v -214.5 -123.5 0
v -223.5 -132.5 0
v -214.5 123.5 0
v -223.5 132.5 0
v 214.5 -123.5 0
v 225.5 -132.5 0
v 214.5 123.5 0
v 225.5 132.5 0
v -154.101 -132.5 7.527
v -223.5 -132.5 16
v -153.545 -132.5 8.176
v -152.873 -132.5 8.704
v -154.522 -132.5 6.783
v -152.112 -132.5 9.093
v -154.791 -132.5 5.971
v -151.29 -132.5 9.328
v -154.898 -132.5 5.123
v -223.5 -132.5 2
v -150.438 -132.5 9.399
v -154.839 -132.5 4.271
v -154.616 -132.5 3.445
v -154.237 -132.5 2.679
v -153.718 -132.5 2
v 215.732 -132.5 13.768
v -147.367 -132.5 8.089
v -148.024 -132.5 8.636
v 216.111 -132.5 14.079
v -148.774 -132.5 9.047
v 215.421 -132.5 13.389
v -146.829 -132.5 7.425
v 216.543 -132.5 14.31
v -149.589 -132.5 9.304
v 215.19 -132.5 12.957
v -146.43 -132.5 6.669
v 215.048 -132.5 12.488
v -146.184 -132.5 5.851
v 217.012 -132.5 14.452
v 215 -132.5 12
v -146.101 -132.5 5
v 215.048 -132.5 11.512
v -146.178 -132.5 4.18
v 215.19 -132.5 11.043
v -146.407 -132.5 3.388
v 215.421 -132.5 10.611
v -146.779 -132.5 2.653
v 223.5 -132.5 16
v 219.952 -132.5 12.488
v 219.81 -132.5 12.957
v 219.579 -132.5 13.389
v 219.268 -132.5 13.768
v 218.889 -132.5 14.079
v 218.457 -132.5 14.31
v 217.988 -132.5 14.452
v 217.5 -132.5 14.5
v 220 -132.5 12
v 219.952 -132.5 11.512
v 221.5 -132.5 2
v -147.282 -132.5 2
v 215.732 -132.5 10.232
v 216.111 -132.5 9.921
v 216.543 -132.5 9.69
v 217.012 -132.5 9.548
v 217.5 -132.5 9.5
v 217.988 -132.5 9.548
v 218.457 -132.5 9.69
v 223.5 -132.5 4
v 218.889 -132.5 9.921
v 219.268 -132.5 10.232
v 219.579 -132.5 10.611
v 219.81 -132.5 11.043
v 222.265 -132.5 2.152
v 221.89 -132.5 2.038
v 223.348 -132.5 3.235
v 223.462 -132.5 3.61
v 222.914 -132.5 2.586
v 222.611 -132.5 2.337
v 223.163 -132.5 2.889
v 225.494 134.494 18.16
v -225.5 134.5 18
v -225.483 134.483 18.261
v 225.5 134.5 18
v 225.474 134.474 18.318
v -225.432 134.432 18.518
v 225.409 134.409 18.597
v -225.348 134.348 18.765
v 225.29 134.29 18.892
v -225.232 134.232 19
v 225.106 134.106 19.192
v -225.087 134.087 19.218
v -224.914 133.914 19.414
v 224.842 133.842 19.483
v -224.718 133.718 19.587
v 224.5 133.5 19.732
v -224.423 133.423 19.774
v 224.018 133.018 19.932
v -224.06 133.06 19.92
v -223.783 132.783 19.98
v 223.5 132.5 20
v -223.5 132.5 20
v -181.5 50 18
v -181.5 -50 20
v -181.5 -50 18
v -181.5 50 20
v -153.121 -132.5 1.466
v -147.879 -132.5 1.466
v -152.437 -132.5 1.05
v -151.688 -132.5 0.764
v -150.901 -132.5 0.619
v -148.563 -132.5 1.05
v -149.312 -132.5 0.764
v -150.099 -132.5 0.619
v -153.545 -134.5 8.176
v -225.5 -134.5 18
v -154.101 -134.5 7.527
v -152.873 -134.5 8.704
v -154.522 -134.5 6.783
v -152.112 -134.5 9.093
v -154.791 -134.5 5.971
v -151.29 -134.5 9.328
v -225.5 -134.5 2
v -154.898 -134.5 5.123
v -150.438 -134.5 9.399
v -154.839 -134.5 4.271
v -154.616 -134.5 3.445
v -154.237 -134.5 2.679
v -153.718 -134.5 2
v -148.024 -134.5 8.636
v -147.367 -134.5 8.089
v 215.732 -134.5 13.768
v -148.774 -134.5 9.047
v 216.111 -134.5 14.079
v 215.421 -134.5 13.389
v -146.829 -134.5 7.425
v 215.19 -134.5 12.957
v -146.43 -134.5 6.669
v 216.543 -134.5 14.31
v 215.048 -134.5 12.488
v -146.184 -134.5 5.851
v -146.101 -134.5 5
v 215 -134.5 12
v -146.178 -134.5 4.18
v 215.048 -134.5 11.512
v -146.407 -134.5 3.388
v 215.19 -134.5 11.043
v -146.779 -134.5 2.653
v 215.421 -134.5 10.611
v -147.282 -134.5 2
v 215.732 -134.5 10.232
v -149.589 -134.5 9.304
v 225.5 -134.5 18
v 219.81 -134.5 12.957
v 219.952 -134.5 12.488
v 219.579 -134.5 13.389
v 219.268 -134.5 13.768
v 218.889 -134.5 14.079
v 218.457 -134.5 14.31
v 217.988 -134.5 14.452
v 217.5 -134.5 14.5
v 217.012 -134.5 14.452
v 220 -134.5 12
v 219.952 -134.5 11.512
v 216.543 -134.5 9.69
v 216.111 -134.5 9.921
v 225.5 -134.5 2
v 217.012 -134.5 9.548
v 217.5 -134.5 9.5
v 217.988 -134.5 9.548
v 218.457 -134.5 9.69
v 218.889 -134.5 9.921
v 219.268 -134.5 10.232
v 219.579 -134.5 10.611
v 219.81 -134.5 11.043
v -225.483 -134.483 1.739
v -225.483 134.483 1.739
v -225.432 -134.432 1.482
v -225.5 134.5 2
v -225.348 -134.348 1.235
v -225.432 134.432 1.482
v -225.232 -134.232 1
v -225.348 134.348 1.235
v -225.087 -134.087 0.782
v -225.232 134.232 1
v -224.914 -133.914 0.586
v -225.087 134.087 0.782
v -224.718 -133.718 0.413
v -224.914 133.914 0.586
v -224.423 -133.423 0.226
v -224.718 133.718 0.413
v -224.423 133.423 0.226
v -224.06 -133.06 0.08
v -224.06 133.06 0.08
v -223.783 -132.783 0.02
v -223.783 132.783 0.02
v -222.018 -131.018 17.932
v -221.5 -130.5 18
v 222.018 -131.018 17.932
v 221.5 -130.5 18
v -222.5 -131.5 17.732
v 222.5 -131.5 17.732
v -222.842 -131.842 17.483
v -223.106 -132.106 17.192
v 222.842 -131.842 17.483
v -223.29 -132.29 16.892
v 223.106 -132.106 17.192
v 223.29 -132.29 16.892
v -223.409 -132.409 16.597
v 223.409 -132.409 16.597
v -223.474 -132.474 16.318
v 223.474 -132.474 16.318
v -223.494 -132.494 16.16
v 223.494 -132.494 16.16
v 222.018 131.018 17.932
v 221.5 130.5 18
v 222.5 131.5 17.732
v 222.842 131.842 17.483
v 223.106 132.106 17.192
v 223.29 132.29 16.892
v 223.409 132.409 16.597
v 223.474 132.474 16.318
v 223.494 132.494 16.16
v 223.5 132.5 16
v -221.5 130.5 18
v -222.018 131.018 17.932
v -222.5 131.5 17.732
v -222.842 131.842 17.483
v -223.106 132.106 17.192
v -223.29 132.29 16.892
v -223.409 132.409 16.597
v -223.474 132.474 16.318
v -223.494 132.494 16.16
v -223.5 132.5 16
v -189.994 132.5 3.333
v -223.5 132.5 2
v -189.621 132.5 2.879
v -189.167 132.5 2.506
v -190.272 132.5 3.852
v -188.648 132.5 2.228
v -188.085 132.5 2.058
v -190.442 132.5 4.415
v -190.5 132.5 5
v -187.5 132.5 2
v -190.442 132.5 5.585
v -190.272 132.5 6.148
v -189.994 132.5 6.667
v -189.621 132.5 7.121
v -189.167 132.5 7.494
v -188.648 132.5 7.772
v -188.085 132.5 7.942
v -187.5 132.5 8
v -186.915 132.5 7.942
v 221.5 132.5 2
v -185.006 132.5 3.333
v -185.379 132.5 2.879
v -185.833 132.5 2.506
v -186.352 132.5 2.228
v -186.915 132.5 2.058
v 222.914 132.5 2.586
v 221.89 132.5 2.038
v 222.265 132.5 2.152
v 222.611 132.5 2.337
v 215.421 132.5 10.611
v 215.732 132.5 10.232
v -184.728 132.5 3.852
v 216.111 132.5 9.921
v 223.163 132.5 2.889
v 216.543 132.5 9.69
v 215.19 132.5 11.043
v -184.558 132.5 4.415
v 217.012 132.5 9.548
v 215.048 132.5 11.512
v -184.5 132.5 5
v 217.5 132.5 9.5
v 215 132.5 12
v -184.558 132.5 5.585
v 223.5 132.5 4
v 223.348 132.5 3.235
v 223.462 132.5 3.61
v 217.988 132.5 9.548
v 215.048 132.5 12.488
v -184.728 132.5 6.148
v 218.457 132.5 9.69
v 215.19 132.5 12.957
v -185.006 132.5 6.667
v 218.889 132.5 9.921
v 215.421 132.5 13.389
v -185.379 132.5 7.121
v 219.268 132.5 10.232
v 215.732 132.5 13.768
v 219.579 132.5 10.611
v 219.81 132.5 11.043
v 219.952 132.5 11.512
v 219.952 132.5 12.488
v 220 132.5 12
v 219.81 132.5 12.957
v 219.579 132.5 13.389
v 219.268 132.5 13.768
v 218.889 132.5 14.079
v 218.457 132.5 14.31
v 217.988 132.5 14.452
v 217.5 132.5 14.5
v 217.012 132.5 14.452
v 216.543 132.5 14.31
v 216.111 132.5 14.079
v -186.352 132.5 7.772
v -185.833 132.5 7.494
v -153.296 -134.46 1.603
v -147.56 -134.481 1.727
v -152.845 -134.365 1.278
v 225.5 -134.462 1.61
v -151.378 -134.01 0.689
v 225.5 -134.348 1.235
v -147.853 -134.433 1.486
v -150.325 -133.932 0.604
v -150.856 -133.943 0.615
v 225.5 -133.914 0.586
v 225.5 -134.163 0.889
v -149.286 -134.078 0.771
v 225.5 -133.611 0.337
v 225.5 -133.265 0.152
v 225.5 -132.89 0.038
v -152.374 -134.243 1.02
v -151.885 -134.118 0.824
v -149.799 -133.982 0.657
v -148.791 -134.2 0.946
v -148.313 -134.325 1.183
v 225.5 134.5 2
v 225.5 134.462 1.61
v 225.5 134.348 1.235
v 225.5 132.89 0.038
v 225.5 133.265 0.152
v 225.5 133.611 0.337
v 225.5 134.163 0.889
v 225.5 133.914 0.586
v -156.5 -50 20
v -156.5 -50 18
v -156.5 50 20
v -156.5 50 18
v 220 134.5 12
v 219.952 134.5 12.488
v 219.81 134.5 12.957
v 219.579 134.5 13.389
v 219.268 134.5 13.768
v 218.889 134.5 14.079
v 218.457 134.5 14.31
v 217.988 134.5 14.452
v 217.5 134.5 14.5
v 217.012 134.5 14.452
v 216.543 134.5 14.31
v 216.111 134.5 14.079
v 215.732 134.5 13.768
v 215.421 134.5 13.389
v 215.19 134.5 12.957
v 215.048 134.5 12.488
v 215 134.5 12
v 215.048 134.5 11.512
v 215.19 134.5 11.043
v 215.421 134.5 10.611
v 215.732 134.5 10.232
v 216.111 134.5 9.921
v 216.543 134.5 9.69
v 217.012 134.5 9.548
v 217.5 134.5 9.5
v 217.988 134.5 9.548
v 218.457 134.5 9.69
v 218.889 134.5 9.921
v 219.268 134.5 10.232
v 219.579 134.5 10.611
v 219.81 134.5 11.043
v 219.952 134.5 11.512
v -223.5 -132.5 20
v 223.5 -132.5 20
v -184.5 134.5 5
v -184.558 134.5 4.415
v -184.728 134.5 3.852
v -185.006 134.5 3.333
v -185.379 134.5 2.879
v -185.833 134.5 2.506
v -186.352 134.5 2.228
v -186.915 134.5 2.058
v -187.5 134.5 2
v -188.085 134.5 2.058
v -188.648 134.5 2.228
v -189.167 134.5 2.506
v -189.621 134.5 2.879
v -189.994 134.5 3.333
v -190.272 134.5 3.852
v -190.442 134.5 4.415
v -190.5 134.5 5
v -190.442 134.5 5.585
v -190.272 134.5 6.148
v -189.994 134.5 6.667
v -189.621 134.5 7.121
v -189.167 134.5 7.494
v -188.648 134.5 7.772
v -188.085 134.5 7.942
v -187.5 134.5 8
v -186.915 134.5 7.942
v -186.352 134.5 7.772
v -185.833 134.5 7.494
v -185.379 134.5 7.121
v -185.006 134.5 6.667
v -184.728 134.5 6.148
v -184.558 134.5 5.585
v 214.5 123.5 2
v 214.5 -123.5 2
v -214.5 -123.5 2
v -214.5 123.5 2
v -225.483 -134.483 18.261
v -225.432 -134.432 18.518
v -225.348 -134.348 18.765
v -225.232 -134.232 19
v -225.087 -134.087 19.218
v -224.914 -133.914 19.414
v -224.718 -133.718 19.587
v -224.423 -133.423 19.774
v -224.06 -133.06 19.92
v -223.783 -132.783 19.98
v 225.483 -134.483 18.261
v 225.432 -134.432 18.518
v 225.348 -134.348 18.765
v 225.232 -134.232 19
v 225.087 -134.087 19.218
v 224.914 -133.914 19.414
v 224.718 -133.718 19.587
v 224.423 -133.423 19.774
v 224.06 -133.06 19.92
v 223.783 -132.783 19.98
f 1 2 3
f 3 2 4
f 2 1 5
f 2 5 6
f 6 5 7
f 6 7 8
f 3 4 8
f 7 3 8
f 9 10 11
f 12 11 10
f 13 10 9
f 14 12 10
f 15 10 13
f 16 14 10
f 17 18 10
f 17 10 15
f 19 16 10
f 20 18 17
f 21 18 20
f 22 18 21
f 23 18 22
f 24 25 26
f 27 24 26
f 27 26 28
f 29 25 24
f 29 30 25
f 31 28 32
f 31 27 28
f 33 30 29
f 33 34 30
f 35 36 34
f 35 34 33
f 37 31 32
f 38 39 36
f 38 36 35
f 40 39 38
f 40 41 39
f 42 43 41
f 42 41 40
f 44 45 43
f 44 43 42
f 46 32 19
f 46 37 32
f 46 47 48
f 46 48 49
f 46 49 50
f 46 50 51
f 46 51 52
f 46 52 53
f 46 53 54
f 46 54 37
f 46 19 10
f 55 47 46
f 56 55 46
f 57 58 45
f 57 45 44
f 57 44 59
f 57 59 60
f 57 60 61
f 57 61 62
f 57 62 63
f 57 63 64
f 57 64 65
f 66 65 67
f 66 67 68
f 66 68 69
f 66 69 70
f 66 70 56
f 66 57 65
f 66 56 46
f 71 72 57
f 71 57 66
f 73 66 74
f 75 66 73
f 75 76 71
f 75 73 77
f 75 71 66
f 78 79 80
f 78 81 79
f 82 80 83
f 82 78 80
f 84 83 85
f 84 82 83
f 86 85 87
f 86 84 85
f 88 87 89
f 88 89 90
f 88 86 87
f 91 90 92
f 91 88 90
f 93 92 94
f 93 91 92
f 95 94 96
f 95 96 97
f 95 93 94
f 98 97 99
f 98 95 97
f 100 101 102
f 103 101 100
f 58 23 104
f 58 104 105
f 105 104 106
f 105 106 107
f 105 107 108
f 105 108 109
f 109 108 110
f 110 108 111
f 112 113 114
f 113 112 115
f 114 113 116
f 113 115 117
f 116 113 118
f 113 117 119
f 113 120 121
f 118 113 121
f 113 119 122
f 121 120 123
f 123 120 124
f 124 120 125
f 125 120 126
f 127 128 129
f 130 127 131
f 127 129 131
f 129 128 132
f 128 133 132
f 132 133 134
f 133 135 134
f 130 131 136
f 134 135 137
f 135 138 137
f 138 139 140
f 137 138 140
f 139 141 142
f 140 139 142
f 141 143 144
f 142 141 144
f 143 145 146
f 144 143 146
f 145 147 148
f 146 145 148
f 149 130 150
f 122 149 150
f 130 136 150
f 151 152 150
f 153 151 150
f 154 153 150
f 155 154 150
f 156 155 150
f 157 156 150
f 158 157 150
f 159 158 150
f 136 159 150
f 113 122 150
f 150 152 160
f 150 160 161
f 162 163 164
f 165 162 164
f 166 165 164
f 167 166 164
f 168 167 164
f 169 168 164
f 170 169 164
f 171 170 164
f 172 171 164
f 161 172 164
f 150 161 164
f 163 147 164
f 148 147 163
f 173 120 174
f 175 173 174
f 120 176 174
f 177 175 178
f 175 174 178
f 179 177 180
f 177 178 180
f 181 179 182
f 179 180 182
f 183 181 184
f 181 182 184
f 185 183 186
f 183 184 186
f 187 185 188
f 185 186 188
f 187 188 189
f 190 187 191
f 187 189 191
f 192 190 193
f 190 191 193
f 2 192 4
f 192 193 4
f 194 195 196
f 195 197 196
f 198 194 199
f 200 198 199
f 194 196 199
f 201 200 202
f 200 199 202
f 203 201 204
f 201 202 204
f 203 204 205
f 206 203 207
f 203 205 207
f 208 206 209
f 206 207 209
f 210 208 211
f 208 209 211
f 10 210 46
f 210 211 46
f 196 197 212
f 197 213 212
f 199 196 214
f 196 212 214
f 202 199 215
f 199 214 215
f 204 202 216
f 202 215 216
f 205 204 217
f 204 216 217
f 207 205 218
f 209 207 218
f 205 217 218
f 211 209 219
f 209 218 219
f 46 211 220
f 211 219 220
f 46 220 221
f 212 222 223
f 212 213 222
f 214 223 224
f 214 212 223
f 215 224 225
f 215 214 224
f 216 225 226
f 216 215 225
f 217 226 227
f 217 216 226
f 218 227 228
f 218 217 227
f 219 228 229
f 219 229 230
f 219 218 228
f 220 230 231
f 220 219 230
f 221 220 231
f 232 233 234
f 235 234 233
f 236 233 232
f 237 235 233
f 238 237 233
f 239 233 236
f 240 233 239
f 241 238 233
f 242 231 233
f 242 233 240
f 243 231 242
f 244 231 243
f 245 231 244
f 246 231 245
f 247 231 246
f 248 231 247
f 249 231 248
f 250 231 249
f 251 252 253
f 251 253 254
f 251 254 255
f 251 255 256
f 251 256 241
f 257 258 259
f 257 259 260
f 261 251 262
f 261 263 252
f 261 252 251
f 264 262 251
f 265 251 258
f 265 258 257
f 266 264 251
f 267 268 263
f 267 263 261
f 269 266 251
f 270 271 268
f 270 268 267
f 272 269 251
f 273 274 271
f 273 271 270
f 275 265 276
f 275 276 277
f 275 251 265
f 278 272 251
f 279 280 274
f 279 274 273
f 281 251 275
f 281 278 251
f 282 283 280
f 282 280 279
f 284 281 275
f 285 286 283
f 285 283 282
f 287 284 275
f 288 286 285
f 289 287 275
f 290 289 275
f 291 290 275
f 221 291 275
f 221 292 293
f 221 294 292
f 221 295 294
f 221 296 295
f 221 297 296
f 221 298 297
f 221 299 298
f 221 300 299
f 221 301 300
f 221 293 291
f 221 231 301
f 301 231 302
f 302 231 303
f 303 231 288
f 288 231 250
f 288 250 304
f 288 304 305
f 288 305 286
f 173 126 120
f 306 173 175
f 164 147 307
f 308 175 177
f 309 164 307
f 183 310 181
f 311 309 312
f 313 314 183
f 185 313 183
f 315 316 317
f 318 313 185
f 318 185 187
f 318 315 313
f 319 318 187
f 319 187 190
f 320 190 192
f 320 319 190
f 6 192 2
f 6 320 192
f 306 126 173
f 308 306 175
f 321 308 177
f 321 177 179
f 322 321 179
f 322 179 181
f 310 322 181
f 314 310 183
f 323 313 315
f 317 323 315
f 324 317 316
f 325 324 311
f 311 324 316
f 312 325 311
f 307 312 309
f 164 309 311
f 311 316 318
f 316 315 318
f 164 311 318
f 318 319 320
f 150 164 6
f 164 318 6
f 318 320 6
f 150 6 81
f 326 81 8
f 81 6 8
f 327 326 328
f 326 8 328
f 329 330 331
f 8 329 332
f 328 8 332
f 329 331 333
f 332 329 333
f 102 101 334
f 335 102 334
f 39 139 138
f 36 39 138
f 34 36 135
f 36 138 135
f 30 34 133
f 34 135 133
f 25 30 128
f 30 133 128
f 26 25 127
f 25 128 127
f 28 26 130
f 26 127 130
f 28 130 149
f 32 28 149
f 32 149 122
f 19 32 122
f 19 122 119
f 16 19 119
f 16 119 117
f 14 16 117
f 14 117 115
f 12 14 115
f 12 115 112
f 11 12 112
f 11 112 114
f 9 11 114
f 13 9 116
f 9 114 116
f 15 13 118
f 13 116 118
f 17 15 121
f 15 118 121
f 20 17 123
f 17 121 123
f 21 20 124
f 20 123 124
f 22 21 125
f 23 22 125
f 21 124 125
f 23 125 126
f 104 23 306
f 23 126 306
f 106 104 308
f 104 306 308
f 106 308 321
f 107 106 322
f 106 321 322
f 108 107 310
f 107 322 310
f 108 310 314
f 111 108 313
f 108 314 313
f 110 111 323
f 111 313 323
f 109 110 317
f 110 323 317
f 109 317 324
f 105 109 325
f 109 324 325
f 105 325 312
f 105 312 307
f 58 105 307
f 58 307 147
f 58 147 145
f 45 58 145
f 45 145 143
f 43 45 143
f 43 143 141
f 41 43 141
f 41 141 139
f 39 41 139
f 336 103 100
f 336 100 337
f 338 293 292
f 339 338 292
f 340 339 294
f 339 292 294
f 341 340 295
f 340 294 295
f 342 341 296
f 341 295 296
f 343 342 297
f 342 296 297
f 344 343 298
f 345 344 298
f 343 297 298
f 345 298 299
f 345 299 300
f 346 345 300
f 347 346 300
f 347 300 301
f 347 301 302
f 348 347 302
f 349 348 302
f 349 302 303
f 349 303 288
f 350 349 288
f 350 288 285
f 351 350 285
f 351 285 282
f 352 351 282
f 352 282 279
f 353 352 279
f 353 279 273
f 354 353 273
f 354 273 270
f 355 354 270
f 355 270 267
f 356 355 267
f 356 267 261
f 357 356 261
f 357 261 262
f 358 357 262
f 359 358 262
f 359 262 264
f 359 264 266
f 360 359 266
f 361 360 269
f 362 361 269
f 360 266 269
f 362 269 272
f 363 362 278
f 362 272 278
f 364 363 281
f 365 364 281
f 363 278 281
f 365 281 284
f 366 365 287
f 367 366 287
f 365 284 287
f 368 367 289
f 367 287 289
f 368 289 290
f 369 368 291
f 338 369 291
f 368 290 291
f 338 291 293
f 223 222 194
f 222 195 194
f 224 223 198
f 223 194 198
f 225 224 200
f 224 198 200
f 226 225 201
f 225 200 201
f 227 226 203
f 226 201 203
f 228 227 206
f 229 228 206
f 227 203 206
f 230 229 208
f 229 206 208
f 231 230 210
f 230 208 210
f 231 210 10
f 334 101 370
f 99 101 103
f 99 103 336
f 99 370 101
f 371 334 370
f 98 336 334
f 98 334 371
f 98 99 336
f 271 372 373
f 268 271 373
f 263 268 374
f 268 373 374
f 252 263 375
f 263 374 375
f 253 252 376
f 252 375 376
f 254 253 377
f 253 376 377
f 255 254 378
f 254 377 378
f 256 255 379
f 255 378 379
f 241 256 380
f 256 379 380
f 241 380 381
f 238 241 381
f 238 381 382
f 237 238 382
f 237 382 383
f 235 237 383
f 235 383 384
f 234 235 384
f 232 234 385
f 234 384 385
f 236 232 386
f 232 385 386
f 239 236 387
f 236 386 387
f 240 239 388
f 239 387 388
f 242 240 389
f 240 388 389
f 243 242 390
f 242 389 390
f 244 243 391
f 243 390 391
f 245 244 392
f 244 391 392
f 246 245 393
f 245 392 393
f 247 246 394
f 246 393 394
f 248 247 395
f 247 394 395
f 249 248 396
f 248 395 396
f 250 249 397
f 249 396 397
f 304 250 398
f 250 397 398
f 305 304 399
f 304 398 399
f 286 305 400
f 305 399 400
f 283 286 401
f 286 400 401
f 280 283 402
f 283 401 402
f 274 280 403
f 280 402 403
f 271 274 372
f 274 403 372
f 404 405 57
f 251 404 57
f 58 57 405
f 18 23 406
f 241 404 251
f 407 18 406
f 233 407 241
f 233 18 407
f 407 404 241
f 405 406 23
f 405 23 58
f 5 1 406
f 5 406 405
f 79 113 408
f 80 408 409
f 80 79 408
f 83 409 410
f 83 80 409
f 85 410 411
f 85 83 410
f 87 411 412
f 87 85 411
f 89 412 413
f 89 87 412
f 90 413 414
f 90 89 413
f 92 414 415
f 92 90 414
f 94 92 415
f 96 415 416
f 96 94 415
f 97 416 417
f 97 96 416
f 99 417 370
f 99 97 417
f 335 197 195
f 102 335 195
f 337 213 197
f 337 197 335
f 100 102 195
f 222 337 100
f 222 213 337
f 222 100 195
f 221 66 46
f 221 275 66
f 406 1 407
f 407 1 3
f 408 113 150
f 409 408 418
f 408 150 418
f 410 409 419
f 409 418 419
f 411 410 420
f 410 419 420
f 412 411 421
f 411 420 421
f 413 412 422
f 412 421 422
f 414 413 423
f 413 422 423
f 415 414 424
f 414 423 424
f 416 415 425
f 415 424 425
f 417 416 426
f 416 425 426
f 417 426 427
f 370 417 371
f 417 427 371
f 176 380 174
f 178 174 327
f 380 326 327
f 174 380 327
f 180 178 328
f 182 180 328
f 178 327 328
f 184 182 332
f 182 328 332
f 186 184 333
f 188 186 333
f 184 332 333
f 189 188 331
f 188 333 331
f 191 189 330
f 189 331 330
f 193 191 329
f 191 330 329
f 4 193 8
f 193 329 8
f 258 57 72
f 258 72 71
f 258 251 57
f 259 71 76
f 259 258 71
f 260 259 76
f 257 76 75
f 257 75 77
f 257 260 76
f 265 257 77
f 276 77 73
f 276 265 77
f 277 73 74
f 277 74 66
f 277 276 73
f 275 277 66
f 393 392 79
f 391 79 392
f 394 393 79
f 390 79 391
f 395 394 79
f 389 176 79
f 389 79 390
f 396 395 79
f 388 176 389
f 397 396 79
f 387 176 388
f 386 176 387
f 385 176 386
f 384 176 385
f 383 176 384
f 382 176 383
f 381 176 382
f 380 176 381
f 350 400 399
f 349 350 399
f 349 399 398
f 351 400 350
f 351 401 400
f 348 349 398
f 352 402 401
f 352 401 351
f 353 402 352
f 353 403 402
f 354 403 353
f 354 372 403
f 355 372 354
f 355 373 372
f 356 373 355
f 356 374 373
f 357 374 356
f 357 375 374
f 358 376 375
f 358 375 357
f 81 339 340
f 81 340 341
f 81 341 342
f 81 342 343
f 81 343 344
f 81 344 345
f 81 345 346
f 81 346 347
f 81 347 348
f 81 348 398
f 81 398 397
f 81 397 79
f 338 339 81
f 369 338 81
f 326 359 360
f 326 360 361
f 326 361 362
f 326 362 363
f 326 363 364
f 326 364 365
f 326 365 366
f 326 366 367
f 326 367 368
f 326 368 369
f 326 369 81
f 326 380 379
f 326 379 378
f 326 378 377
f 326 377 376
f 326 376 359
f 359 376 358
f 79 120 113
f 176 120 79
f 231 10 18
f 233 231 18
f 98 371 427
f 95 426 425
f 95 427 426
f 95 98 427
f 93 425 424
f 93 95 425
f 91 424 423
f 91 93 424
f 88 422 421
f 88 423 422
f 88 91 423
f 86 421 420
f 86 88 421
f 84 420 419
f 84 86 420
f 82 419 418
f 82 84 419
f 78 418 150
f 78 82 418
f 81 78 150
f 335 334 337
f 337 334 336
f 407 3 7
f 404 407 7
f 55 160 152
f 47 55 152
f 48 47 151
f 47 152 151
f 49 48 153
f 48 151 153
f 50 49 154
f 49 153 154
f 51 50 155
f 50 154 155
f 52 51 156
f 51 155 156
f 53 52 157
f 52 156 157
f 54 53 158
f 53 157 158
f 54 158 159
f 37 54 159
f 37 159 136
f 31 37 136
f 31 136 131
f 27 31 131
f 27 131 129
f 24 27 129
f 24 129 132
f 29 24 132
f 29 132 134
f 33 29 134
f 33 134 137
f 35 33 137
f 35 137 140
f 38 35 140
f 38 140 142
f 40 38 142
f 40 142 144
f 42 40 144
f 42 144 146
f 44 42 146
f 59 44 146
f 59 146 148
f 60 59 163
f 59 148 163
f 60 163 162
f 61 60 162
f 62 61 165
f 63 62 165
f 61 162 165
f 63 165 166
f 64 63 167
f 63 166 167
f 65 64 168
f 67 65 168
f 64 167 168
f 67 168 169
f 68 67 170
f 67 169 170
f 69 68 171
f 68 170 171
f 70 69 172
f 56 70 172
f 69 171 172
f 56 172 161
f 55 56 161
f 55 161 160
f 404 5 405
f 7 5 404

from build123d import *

# Parameters (mm, degrees)
SKETCH1_W           = 451
SKETCH1_H           = 269
BOSS_EXTRUDE1_DEPTH = 20
SHELL1_T            = -11
SKETCH2_W           = 429
SKETCH2_H           = 247
CUT_EXTRUDE1_DEPTH  = 9
SKETCH4_W           = 16
SKETCH4_H           = 247
CUT_EXTRUDE3_DEPTH  = 9
SKETCH8_W           = 438
SKETCH8_H           = 16
CUT_EXTRUDE4_DEPTH  = 9
SKETCH9_W           = 16
SKETCH9_H           = 256
CUT_EXTRUDE5_DEPTH  = 9
SKETCH10_W          = 447
SKETCH10_H          = 16
CUT_EXTRUDE6_DEPTH  = 9
SKETCH11_W          = 25
SKETCH11_H          = 100
CUT_EXTRUDE7_DEPTH  = 2
FILLET1_R           = 2
FILLET2_R           = 2
SKETCH12_R          = 3
CUT_EXTRUDE8_DEPTH  = 2
SKETCH13_R          = 4.399472723
CUT_EXTRUDE9_DEPTH  = 2
SKETCH14_R          = 2.5
CUT_EXTRUDE10_DEPTH = 270


with BuildPart() as part:
    # Sketch1 → Boss-Extrude1 (new body)
    with BuildSketch(Plane.XY):
        Rectangle(SKETCH1_W, SKETCH1_H)
    extrude(amount=BOSS_EXTRUDE1_DEPTH)

    # Shell1
    shell1_openings = [part.faces().sort_by_distance(p)[0] for p in [
        (0, 0, 0),
    ]]
    offset(amount=SHELL1_T, openings=shell1_openings, kind=Kind.INTERSECTION)

    # Sketch2 → Cut-Extrude1 (cut)
    with BuildSketch(Plane(origin=(0, 0, 9), x_dir=(-1, 0, 0), z_dir=(0, 0, -1))):
        Rectangle(SKETCH2_W, SKETCH2_H)
    extrude(amount=-CUT_EXTRUDE1_DEPTH, mode=Mode.SUBTRACT)

    # Sketch4 → Cut-Extrude3 (cut)
    with BuildSketch(Plane.ZY.offset(-214.5)):
        with Locations((10, 0)):
            Rectangle(SKETCH4_W, SKETCH4_H)
    extrude(amount=-CUT_EXTRUDE3_DEPTH, mode=Mode.SUBTRACT)

    # Sketch8 → Cut-Extrude4 (cut)
    with BuildSketch(Plane.XZ.offset(-123.5)):
        with Locations((4.5, 10)):
            Rectangle(SKETCH8_W, SKETCH8_H)
    extrude(amount=-CUT_EXTRUDE4_DEPTH, mode=Mode.SUBTRACT)

    # Sketch9 → Cut-Extrude5 (cut)
    with BuildSketch(Plane(origin=(-214.5, 0, 0), x_dir=(0, 0, -1), z_dir=(1, 0, 0))):
        with Locations((-10, 4.5)):
            Rectangle(SKETCH9_W, SKETCH9_H)
    extrude(amount=-CUT_EXTRUDE5_DEPTH, mode=Mode.SUBTRACT)

    # Sketch10 → Cut-Extrude6 (cut)
    with BuildSketch(Plane(origin=(0, -123.5, 0), x_dir=(1, 0, 0), z_dir=(0, 1, 0))):
        with Locations((0, -10)):
            Rectangle(SKETCH10_W, SKETCH10_H)
    extrude(amount=-CUT_EXTRUDE6_DEPTH, mode=Mode.SUBTRACT)

    # Sketch11 → Cut-Extrude7 (cut)
    with BuildSketch(Plane.XY.offset(20)):
        with Locations((-169, 0)):
            Rectangle(SKETCH11_W, SKETCH11_H)
    extrude(amount=-CUT_EXTRUDE7_DEPTH, mode=Mode.SUBTRACT)

    # Fillet1
    fillet1_edges = [part.edges().sort_by_distance(p)[0] for p in [
        (-225.5, 0, 20),
        (0, -134.5, 20),
        (223.5, 0, 2),
        (225.5, 0, 20),
        (0, -134.5, 0),
        (-225.5, 0, 0),
        (0, 134.5, 0),
        (0, 134.5, 20),
    ]]
    fillet(fillet1_edges, radius=FILLET1_R)

    # Fillet2
    fillet2_edges = [part.edges().sort_by_distance(p)[0] for p in [
        (223.5, 0, 18),
        (0, 132.5, 18),
        (-223.5, 0, 18),
        (0, -132.5, 18),
    ]]
    fillet(fillet2_edges, radius=FILLET2_R)

    # Sketch12 → Cut-Extrude8 (cut)
    with BuildSketch(Plane(origin=(0, 134.5, 0), x_dir=(1, 0, 0), z_dir=(0, 1, 0))):
        with Locations((-187.5, -5)):
            Circle(SKETCH12_R)
    extrude(amount=-CUT_EXTRUDE8_DEPTH, mode=Mode.SUBTRACT)

    # Sketch13 → Cut-Extrude9 (cut)
    with BuildSketch(Plane.XZ.offset(134.5)):
        with Locations((-150.5, 5)):
            Circle(SKETCH13_R)
    extrude(amount=-CUT_EXTRUDE9_DEPTH, mode=Mode.SUBTRACT)

    # Sketch14 → Cut-Extrude10 (cut, through all)
    with BuildSketch(Plane.XZ.offset(134.5)):
        with Locations((217.5, 12)):
            Circle(SKETCH14_R)
    extrude(amount=-CUT_EXTRUDE10_DEPTH, mode=Mode.SUBTRACT)


solid = part.part
